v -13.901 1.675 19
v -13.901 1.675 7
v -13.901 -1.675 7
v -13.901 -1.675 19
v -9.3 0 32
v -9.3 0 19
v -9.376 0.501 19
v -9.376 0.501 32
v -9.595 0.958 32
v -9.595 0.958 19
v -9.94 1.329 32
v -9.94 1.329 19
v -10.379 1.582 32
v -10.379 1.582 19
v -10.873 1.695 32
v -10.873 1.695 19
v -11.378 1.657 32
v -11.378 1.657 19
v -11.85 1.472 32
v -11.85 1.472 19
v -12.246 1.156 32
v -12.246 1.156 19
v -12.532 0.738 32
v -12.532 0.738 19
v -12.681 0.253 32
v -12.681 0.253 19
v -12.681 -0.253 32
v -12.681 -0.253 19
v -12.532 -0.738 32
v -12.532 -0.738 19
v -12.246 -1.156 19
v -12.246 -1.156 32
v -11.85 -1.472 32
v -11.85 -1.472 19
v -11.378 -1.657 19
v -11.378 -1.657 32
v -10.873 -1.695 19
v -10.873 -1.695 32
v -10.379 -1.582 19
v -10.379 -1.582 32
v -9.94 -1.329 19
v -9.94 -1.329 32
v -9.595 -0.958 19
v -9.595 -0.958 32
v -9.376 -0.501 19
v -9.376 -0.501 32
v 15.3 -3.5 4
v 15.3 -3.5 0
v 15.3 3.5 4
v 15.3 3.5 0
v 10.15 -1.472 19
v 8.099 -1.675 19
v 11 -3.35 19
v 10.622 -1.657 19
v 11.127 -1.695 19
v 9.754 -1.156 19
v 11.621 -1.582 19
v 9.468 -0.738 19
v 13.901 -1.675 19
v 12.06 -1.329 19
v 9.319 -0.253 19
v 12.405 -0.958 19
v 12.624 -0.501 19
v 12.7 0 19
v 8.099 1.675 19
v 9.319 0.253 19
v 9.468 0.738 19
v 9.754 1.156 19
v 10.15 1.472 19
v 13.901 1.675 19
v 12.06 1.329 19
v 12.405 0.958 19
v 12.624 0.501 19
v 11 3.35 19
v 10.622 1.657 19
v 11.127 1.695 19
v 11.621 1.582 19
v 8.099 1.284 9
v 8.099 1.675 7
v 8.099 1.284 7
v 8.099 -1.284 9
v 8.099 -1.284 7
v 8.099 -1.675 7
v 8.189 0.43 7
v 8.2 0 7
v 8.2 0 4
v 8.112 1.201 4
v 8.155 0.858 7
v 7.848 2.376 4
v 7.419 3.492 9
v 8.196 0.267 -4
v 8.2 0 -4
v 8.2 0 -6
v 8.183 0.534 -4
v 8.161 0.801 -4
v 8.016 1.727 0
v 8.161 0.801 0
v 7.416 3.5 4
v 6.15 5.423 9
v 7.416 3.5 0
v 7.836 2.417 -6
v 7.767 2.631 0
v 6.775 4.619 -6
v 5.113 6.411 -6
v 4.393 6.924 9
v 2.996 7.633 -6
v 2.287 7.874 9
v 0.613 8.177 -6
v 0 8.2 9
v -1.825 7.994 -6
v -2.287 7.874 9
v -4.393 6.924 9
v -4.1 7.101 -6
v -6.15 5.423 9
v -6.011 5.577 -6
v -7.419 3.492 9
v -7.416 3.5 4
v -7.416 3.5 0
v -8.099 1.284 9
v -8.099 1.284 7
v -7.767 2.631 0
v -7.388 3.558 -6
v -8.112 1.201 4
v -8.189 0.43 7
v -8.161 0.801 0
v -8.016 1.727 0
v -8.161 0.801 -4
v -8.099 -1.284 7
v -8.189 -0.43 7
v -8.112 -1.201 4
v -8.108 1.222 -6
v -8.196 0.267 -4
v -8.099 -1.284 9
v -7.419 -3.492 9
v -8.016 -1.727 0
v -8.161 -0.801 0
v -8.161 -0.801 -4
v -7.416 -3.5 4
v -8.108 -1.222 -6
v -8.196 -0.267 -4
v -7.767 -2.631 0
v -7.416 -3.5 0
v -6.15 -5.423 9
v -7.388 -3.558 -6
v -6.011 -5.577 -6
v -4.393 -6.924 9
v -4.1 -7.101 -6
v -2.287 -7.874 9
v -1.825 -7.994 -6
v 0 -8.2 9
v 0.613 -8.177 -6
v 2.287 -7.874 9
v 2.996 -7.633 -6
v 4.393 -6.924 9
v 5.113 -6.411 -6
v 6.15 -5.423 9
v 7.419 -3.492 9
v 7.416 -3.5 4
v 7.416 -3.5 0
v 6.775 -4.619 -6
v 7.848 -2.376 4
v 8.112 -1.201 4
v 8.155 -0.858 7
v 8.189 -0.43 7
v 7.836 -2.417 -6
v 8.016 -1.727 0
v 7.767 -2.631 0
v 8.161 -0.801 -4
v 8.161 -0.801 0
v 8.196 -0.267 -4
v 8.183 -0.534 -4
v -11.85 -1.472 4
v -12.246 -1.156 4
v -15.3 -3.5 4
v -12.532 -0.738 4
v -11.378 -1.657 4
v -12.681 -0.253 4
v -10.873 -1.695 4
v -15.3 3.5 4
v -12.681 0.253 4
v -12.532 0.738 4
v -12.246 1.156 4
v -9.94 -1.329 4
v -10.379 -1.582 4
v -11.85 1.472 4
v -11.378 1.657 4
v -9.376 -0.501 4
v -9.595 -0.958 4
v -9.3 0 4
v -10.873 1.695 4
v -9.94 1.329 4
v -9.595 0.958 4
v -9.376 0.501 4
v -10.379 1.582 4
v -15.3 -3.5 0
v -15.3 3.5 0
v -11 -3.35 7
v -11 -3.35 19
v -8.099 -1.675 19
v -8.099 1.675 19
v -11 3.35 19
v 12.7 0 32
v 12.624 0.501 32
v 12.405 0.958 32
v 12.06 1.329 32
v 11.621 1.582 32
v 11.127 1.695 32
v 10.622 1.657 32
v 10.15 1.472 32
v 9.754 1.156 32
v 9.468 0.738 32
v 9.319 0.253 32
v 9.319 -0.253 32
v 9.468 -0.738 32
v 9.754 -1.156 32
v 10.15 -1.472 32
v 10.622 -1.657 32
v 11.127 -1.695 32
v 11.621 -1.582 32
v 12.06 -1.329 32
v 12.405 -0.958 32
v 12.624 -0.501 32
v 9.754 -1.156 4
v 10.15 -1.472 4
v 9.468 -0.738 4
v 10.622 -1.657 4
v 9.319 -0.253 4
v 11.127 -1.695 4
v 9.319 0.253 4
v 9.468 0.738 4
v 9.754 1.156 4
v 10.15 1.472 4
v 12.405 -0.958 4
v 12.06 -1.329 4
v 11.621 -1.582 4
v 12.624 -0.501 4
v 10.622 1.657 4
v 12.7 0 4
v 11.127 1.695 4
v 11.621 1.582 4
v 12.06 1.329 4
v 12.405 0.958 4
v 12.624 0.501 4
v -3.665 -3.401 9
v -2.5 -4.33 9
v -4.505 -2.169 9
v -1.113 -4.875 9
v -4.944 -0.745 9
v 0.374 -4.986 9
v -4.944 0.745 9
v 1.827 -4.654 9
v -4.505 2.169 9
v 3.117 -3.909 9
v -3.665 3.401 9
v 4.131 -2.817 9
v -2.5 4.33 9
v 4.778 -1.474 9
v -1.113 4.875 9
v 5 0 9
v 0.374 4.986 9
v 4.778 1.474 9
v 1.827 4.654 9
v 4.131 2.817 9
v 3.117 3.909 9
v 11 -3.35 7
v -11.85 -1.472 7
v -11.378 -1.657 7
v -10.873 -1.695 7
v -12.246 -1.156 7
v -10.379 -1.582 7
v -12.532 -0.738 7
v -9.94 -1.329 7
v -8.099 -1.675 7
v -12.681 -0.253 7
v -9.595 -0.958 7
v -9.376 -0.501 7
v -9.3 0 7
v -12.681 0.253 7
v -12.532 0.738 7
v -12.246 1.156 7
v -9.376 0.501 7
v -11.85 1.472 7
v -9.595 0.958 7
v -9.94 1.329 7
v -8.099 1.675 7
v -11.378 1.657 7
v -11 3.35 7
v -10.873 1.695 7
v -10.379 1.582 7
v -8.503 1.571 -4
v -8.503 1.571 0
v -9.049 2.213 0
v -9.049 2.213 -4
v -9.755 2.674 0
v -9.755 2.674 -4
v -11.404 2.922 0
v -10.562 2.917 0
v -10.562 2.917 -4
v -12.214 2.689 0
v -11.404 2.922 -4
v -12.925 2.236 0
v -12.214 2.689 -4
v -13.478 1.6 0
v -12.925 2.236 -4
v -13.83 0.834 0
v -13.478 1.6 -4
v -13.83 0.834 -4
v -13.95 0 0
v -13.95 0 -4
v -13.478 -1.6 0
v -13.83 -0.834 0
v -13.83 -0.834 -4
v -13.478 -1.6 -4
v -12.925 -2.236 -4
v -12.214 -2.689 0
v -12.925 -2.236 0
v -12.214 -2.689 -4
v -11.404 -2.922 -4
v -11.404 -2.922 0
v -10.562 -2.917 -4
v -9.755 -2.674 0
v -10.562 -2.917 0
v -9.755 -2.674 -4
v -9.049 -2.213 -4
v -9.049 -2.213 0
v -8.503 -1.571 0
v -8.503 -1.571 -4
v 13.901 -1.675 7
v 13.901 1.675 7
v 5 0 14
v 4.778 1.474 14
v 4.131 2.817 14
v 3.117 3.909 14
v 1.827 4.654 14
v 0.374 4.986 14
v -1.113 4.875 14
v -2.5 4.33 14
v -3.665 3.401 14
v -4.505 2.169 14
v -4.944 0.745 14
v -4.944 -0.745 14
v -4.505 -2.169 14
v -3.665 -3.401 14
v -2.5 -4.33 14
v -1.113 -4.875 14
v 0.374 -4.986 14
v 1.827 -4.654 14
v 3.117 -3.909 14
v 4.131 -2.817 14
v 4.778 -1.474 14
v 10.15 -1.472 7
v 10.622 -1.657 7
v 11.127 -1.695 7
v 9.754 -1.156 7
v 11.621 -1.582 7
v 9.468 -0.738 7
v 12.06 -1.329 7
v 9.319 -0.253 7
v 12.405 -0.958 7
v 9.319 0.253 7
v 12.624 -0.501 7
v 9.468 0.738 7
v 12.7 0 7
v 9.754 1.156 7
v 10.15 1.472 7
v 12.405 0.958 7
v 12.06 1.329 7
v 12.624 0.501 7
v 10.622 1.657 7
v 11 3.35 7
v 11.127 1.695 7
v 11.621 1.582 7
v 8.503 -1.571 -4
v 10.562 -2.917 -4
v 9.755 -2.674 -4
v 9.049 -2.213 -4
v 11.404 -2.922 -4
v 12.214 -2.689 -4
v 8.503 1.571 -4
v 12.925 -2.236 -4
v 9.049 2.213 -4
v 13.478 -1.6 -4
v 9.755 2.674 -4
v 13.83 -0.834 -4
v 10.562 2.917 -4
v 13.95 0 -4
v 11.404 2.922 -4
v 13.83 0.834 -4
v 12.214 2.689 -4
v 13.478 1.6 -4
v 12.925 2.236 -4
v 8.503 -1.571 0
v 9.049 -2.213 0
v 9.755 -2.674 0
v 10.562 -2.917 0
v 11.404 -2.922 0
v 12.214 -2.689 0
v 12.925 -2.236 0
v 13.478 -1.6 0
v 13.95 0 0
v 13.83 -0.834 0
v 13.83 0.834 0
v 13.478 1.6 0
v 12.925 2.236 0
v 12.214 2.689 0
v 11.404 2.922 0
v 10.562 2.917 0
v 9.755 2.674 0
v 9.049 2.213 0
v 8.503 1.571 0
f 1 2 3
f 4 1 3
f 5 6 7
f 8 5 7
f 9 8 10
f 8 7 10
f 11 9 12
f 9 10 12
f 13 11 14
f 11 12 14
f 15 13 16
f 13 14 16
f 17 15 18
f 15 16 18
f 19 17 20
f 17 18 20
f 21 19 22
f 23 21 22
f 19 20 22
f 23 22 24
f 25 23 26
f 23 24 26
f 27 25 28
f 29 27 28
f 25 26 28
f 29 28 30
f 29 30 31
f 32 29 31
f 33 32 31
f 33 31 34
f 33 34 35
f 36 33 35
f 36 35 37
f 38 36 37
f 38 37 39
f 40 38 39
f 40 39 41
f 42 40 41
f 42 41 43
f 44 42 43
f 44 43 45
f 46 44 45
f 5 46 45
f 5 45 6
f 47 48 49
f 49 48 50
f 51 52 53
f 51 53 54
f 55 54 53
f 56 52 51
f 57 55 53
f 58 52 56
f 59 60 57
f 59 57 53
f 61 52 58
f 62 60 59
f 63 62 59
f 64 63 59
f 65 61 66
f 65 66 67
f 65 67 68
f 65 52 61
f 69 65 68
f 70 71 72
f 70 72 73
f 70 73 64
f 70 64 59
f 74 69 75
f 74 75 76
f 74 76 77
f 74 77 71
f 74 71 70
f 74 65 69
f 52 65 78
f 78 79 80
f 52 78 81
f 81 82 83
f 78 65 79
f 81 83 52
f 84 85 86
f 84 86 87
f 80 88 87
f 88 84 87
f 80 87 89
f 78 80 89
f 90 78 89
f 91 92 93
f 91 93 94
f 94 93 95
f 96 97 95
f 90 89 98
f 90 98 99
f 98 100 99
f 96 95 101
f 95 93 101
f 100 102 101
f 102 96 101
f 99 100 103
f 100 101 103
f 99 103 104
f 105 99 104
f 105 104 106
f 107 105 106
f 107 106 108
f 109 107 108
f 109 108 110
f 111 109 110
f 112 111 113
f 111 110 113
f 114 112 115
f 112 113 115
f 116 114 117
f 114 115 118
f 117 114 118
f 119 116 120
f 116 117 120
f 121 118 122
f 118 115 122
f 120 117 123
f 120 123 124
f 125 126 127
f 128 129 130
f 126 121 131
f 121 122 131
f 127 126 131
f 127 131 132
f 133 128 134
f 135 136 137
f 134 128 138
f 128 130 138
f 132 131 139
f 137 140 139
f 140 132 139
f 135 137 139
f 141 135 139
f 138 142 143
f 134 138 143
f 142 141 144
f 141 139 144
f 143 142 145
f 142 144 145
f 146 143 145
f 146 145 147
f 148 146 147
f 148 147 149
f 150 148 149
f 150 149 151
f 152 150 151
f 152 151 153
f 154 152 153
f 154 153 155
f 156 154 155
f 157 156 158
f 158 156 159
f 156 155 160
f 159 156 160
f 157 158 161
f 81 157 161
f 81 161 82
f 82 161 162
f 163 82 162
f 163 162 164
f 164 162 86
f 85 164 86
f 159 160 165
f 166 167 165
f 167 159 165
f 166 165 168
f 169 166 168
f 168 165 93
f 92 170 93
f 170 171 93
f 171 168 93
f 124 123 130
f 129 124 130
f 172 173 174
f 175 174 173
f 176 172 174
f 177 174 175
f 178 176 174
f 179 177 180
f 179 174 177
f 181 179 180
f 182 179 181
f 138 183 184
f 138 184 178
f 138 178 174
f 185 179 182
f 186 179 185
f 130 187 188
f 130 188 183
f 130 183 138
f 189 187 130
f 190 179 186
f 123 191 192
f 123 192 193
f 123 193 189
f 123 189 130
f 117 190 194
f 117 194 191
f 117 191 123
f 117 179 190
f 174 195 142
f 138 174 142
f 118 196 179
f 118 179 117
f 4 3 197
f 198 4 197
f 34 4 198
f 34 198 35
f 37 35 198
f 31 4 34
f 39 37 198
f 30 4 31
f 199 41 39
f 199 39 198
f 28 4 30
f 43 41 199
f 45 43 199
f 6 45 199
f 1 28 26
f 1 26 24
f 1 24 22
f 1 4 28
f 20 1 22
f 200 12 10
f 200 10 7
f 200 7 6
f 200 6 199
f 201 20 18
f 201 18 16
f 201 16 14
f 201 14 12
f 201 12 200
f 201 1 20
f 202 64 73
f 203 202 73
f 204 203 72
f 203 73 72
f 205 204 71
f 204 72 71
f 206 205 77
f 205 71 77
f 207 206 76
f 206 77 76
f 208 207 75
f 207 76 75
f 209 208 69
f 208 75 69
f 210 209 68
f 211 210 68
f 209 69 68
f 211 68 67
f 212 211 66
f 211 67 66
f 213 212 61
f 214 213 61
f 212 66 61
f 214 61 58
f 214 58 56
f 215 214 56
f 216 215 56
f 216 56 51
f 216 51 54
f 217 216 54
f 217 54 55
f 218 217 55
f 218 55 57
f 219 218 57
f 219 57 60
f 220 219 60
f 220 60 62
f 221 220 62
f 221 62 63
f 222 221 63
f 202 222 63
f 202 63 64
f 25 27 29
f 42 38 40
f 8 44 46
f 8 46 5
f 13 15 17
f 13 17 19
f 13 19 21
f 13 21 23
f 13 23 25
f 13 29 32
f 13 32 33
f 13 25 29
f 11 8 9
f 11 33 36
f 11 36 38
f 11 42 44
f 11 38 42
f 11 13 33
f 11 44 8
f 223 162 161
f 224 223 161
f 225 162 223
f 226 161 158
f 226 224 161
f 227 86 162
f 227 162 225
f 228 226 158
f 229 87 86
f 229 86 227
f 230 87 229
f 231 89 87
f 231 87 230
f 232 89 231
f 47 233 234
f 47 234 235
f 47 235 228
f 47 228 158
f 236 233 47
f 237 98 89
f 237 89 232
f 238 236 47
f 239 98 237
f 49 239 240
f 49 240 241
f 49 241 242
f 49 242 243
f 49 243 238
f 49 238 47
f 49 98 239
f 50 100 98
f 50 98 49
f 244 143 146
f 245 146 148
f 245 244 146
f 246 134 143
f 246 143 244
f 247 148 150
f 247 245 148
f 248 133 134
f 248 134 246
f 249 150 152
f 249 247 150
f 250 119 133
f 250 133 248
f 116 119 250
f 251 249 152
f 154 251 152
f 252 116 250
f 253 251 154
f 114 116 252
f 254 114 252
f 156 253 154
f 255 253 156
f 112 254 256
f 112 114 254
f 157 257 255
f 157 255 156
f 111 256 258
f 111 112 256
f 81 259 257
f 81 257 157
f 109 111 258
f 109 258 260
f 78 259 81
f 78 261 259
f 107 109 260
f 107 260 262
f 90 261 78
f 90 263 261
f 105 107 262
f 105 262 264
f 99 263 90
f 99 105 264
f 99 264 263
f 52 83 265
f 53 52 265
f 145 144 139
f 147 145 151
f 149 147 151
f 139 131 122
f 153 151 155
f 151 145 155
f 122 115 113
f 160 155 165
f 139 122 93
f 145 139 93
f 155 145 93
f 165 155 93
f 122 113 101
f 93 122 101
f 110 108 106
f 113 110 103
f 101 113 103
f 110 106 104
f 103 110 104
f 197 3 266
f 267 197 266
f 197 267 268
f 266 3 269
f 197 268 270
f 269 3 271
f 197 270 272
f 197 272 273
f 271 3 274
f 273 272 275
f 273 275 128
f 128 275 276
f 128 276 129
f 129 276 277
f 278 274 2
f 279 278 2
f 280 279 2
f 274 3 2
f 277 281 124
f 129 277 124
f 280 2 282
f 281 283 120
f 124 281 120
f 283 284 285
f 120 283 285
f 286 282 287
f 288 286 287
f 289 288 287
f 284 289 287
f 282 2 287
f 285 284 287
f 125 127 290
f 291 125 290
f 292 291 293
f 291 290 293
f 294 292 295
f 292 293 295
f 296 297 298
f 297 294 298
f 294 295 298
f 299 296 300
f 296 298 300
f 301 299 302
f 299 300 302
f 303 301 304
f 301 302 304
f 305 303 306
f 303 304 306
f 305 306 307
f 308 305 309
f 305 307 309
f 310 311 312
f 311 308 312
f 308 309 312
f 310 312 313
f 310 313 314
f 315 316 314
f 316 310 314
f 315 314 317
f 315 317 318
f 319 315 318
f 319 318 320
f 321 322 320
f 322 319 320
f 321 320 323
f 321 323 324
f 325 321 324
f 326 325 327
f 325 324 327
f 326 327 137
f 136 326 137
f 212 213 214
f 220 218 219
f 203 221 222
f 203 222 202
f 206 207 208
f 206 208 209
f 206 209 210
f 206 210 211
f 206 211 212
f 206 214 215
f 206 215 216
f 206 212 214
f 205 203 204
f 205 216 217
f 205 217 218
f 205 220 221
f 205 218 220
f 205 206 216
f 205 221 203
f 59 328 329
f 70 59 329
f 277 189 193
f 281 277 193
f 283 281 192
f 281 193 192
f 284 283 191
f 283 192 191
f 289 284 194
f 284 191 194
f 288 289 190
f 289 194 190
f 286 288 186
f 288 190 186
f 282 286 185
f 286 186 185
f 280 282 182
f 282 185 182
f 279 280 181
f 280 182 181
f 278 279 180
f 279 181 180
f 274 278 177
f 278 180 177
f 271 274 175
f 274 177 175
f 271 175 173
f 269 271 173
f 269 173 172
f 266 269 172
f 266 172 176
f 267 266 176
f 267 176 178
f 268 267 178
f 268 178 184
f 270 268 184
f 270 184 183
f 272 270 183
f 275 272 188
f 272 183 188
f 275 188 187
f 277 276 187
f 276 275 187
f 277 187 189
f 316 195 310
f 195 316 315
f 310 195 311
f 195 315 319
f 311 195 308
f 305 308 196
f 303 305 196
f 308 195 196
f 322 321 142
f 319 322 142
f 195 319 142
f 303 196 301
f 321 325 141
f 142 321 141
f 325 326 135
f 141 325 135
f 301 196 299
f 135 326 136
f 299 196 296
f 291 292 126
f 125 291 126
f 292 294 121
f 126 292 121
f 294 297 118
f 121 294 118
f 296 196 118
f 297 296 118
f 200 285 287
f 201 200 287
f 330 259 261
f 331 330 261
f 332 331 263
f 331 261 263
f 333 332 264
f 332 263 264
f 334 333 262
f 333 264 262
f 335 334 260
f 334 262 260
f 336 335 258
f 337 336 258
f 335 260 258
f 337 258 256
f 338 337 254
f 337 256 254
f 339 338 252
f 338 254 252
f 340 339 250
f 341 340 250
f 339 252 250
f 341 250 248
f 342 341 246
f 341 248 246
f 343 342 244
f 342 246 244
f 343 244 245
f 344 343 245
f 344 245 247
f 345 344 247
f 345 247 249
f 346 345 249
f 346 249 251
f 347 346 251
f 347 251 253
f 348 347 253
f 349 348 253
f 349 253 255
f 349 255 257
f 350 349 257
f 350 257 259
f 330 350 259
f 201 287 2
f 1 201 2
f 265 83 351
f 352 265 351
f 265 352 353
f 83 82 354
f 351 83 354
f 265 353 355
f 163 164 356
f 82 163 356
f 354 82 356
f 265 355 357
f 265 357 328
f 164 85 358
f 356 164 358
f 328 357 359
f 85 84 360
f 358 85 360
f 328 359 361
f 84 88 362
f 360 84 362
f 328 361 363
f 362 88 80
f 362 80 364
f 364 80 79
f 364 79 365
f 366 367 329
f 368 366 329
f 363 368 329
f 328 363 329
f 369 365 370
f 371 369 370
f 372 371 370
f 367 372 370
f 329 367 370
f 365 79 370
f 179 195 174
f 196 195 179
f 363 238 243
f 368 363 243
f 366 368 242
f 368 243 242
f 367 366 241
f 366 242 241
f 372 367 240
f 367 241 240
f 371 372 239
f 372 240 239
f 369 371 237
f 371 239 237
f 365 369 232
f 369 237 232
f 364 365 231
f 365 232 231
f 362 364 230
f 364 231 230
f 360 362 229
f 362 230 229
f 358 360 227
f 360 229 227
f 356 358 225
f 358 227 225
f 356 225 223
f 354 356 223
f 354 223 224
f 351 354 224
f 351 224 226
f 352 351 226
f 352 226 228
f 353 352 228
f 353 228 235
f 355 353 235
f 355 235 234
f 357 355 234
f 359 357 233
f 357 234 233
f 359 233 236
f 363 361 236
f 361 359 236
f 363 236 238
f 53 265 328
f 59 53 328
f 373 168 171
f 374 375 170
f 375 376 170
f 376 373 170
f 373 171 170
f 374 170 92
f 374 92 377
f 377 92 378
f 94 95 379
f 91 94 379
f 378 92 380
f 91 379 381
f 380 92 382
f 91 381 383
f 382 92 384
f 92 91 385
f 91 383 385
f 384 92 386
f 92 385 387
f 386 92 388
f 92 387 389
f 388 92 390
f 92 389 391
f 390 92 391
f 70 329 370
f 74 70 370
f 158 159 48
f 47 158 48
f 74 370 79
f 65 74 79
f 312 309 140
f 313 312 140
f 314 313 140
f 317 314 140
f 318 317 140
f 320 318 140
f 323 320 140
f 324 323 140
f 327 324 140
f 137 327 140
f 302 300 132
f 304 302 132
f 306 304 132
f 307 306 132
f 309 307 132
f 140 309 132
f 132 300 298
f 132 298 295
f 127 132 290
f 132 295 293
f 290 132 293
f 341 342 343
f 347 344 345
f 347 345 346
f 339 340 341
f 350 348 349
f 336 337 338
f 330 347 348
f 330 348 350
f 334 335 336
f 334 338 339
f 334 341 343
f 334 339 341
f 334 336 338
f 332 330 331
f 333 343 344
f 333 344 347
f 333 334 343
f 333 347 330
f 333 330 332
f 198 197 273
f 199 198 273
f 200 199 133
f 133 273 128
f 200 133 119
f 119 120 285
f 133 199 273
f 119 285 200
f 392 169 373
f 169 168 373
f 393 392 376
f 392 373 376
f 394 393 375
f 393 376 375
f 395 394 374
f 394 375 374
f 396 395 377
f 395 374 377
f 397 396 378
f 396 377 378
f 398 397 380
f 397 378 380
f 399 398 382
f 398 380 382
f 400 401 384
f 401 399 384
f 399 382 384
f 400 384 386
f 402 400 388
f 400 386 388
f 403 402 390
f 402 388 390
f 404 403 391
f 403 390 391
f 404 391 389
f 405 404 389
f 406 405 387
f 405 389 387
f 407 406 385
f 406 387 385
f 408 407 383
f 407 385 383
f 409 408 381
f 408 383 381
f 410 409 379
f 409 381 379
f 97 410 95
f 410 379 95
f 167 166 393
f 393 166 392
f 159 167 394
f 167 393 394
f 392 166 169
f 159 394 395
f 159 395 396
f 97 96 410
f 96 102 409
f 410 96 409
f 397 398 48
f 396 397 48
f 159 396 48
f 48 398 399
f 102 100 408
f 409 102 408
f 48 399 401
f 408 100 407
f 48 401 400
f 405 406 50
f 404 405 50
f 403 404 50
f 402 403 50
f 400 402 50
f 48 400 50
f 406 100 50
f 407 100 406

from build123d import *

# Parameters (mm, degrees)
PRISM_DEPTH              = 12
CLONE139_PLACEMENT_ANGLE = 30
BOX251_W                 = 30.6
BOX251_H                 = 7
BOX251_DEPTH             = 4
CYLINDER_R               = 2.95
CYLINDER_DEPTH           = 7
CYLINDER001_R            = 1.7
CYLINDER001_DEPTH        = 30
CYLINDER1015_R           = 5
CYLINDER1015_DEPTH       = 10
CYLINDER1003_R           = 8.2
CYLINDER1003_DEPTH       = 15
CLONE140_PLACEMENT_ANGLE = 30


with BuildPart() as m3nut:
    # Prism → Prism (new body)
    with BuildSketch(Plane.XY):
        Polygon((3.35, 0), (1.675, 2.901185), (-1.675, 2.901185), (-3.35, 0), (-1.675, -2.901185), (1.675, -2.901185), align=None)
    extrude(amount=PRISM_DEPTH)


with BuildPart() as clone_of_m3nut005:
    # Clone139 base: copy of M3Nut
    add(m3nut.part)


with BuildPart() as clone_of_m3nut005_1:
    # Clone139 placement: moved
    add(clone_of_m3nut005.part.moved(Location((11, 0, 7))).rotate(Axis((11, 0, 7), (0, 0, 1)), CLONE139_PLACEMENT_ANGLE))


with BuildPart() as cube015:
    # Box251 → Box251 (new body)
    with BuildSketch(Plane(origin=(-15.3, -3.5, 0), x_dir=(1, 0, 0), z_dir=(0, 0, 1))):
        with Locations((15.3, 3.5)):
            Rectangle(BOX251_W, BOX251_H)
    extrude(amount=BOX251_DEPTH)


with BuildPart() as m3bolthead:
    # Cylinder → Cylinder (new body)
    with BuildSketch(Plane.XY):
        Circle(CYLINDER_R)
    extrude(amount=CYLINDER_DEPTH)


with BuildPart() as m3bolt:
    # Cylinder001 → Cylinder001 (new body)
    with BuildSketch(Plane.XY.offset(6)):
        Circle(CYLINDER001_R)
    extrude(amount=CYLINDER001_DEPTH)

    # Fusion: union M3BoltHead
    add(m3bolthead.part)


with BuildPart() as clone_of_m3bolt039:
    # Clone137 base: copy of M3Bolt
    add(m3bolt.part)


with BuildPart() as clone_of_m3bolt039_1:
    # Clone137 placement: moved
    add(clone_of_m3bolt039.part.moved(Location((11, 0, -4))))


with BuildPart() as clone_of_m3bolt040:
    # Clone138 base: copy of M3Bolt
    add(m3bolt.part)


with BuildPart() as clone_of_m3bolt040_1:
    # Clone138 placement: moved
    add(clone_of_m3bolt040.part.moved(Location((-11, 0, -4))))


with BuildPart() as cylinder021:
    # Cylinder1015 → Cylinder1015 (new body)
    with BuildSketch(Plane.XY.offset(4)):
        Circle(CYLINDER1015_R)
    extrude(amount=CYLINDER1015_DEPTH)


with BuildPart() as clone_of_bearing625zzmaster:
    # Cylinder1003 → Cylinder1003 (new body)
    with BuildSketch(Plane.XY):
        Circle(CYLINDER1003_R)
    extrude(amount=CYLINDER1003_DEPTH)


with BuildPart() as clone_of_bearing625zzmaster_1:
    # Clone136 placement: moved
    add(clone_of_bearing625zzmaster.part.moved(Location((0, 0, -6))))


with BuildPart() as bearing625zzholes:
    # Clone140 base: copy of M3Nut
    add(m3nut.part)


with BuildPart() as bearing625zzholes_1:
    # Clone140 placement: moved
    add(bearing625zzholes.part.moved(Location((-11, 0, 7))).rotate(Axis((-11, 0, 7), (0, 0, 1)), CLONE140_PLACEMENT_ANGLE))

    # Fusion062: union Clone of M3Nut005, Cube015, Clone of M3Bolt039, Clone of M3Bolt040, Cylinder021, Clone of Bearing625ZZMaster
    add(clone_of_m3nut005_1.part)
    add(cube015.part)
    add(clone_of_m3bolt039_1.part)
    add(clone_of_m3bolt040_1.part)
    add(cylinder021.part)
    add(clone_of_bearing625zzmaster_1.part)


solid = bearing625zzholes_1.part
